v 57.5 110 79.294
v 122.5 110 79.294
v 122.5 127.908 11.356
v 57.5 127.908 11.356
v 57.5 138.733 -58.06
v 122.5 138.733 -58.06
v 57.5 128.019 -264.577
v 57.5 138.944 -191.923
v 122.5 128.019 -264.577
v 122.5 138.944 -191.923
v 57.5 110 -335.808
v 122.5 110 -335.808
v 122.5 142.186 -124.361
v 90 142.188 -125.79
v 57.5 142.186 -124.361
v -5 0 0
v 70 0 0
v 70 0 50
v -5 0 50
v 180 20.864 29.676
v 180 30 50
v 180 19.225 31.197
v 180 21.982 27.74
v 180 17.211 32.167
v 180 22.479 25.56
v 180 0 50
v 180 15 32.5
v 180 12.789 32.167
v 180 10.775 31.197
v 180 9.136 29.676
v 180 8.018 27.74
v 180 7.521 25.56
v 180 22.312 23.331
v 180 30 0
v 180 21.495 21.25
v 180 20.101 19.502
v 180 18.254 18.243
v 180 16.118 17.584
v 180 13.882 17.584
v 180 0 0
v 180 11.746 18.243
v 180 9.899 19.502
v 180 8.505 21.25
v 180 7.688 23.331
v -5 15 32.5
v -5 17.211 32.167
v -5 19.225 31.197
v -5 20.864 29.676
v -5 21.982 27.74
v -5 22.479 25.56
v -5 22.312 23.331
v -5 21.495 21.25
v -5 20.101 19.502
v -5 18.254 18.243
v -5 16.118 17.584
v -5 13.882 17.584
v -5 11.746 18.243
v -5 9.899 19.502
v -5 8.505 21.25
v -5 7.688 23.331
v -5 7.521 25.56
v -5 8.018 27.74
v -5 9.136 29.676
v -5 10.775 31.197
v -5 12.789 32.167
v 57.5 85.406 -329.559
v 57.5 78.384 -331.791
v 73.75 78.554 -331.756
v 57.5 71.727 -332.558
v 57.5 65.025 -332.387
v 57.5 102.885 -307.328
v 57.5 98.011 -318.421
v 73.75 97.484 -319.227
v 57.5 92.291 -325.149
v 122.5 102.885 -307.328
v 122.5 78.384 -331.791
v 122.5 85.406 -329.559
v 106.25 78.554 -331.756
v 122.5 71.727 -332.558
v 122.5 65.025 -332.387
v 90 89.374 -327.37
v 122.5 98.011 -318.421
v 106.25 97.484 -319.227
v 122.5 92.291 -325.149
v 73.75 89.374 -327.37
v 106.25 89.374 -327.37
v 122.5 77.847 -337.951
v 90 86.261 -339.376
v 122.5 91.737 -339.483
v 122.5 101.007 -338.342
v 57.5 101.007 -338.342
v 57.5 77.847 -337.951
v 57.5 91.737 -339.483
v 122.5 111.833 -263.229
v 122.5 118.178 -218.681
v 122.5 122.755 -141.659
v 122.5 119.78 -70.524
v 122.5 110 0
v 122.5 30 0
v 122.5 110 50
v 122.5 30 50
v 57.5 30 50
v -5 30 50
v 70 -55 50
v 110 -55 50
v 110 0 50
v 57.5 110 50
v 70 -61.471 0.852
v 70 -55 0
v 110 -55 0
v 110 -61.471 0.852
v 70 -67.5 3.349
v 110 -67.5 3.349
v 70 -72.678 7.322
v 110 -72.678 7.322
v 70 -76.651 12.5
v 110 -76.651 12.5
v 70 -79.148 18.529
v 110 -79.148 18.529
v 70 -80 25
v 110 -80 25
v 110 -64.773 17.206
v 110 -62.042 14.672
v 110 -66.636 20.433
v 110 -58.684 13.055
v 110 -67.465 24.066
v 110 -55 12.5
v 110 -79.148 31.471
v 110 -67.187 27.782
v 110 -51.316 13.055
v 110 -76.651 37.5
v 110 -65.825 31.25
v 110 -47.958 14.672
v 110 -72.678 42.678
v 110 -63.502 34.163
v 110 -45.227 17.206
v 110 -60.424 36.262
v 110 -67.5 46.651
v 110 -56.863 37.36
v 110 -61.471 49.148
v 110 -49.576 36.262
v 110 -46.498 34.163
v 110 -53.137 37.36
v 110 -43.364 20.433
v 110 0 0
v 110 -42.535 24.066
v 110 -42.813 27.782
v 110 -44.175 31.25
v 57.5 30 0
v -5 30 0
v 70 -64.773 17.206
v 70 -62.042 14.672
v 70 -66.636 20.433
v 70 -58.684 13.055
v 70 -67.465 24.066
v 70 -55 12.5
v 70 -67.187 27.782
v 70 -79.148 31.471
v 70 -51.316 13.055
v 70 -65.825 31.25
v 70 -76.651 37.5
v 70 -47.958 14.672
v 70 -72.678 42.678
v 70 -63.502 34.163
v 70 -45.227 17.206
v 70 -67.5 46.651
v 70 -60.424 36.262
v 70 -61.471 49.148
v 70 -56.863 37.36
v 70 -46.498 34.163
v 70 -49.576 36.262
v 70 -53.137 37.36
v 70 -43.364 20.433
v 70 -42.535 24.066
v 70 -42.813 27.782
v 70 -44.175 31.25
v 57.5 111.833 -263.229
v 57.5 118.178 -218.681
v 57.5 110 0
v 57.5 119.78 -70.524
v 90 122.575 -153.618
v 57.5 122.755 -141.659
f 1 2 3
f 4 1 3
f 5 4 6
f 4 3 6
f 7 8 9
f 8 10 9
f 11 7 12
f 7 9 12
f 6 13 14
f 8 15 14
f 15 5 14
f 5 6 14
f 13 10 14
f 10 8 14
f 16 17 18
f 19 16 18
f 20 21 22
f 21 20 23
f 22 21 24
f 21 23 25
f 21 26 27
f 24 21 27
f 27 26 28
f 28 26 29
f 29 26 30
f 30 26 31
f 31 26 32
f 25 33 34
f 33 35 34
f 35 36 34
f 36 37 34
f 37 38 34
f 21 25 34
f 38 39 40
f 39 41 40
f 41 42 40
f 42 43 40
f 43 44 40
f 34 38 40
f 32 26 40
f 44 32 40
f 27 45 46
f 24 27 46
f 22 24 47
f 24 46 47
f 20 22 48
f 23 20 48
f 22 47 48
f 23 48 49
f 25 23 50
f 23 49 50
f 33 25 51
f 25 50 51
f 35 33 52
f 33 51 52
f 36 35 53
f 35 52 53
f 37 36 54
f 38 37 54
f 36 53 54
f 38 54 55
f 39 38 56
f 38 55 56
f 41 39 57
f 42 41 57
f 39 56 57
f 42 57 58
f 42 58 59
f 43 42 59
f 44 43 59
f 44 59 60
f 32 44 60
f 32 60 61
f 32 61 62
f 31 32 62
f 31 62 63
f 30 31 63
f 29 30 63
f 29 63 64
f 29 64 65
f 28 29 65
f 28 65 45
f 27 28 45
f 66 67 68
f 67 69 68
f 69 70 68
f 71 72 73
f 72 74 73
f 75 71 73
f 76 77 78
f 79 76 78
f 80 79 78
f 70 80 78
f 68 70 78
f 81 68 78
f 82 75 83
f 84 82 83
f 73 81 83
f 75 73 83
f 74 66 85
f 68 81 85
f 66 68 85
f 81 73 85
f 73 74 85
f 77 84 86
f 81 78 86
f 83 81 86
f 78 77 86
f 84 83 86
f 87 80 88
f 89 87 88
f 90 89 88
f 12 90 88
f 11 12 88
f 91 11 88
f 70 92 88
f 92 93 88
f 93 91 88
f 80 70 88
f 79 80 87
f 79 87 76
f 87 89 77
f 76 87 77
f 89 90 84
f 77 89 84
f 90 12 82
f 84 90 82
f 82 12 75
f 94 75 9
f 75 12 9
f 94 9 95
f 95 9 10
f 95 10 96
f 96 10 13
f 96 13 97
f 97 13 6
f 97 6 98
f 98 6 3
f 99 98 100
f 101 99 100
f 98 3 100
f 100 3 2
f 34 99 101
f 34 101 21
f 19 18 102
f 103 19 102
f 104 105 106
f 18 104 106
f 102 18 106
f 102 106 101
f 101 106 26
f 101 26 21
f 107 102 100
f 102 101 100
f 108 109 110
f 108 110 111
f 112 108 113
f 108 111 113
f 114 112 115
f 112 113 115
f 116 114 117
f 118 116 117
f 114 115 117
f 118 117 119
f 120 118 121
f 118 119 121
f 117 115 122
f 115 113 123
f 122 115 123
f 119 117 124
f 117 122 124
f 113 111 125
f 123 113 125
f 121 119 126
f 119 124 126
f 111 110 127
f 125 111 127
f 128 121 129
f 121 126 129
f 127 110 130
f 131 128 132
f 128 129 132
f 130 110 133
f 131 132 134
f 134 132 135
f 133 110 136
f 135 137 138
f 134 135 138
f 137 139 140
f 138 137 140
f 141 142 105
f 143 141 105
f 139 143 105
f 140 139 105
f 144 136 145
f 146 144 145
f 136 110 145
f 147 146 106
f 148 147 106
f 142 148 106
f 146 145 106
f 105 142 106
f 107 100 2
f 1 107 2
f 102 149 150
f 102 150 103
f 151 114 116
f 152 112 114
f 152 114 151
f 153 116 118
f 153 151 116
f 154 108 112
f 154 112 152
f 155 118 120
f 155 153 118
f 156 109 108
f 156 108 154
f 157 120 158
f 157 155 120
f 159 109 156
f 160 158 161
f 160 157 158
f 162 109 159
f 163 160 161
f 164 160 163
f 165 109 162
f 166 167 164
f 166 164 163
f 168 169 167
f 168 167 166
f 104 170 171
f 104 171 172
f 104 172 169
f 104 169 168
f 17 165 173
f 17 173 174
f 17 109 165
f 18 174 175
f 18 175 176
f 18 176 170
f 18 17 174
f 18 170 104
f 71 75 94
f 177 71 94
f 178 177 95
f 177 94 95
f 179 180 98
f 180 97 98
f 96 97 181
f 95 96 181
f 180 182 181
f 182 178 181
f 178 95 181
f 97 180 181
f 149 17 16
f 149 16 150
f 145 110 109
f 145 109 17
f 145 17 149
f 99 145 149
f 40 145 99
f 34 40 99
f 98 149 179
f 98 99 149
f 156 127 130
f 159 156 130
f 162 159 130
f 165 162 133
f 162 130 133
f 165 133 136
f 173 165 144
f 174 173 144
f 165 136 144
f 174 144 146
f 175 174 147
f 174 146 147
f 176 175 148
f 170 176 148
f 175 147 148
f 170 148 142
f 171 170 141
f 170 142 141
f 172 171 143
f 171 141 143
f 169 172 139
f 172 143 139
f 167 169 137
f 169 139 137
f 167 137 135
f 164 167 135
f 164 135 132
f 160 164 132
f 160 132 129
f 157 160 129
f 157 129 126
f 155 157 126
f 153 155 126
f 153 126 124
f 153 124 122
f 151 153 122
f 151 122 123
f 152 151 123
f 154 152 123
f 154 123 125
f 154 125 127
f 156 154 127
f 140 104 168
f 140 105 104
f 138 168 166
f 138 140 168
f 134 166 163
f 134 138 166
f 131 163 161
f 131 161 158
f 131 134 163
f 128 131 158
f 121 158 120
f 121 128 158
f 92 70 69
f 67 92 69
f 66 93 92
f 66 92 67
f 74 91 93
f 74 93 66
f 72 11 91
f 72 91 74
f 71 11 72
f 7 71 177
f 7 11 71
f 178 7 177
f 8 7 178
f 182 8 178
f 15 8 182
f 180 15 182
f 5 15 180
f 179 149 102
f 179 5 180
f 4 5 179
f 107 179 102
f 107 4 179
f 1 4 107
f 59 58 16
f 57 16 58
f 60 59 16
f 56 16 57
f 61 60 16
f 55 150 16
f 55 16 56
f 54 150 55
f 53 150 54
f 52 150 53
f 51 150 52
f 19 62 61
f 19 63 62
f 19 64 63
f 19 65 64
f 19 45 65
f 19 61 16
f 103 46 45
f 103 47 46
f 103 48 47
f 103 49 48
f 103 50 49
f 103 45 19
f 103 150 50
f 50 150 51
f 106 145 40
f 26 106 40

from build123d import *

# Parameters (mm, degrees)
SKETCH_1_W          = 180
SKETCH_1_H          = 50
EXTRUDE_1_DEPTH     = 30
SKETCH_2_W          = 40
SKETCH_2_H          = 50
EXTRUDE_2_DEPTH     = 80
FILLET_1_R          = 25
SKETCH_3_R          = 12.5
CUT_EXTRUDE_2_DEPTH = 145.913767462
SKETCH_7_W          = 25
SKETCH_7_H          = 50
EXTRUDE_5_DEPTH     = 80
EXTRUDE_6_REACH     = 213.019
SKETCH_9_W          = 25.5
SKETCH_9_H          = 50
CUT_EXTRUDE_3_DEPTH = 401.320460854
SKETCH_10_W         = 65
SKETCH_10_H         = 50
EXTRUDE_7_DEPTH     = 80
SKETCH_11_W         = 50
SKETCH_11_H         = 30
EXTRUDE_8_DEPTH     = 10
SKETCH_12_W         = 50
SKETCH_12_H         = 30
CUT_EXTRUDE_4_DEPTH = 5
SKETCH_13_R         = 7.5
CUT_EXTRUDE_5_DEPTH = 412.96204223


with BuildPart() as part:
    # 草图1 → 凸台-拉伸1 (new body)
    with BuildSketch(Plane(origin=(0, 0, 0), x_dir=(1, 0, 0), z_dir=(0, 1, 0))):
        with Locations((90, -25)):
            Rectangle(SKETCH_1_W, SKETCH_1_H)
    extrude(amount=EXTRUDE_1_DEPTH)

    # 草图2 → 凸台-拉伸2 (add)
    with BuildSketch(Plane.XZ):
        with Locations((90, 25)):
            Rectangle(SKETCH_2_W, SKETCH_2_H)
    extrude(amount=EXTRUDE_2_DEPTH)

    # 圆角1
    fillet_1_edges = [part.edges().sort_by_distance(p)[0] for p in [
        (90, -80, 50),
        (90, -80, 0),
    ]]
    fillet(fillet_1_edges, radius=FILLET_1_R - 0.0001)  # a hair under: the kernel refuses the full size

    # 草图3 → 切除-拉伸2 (cut, through all)
    with BuildSketch(Plane(origin=(110, 0, 0), x_dir=(0, 0, -1), z_dir=(1, 0, 0))):
        with Locations((-25, -55)):
            Circle(SKETCH_3_R)
    extrude(amount=-CUT_EXTRUDE_2_DEPTH, mode=Mode.SUBTRACT)

    # 草图7 → 凸台-拉伸5 (add)
    with BuildSketch(Plane(origin=(0, 30, 0), x_dir=(1, 0, 0), z_dir=(0, 1, 0))):
        with Locations((19.5, -25)):
            Rectangle(SKETCH_7_W, SKETCH_7_H)
        with Locations((160.5, -25)):
            Rectangle(SKETCH_7_W, SKETCH_7_H)
    extrude(amount=EXTRUDE_5_DEPTH)

    # 凸台-拉伸6: up to this face of the body (flat: up to its plane)
    extrude_6_end = Plane(part.part.faces().sort_by_distance((7, 70, 25))[0])
    # 草图8 → 凸台-拉伸6 (add, up to the picked face)
    with BuildSketch(Plane(origin=(173, 0, 0), x_dir=(0, 0, -1), z_dir=(1, 0, 0)), mode=Mode.PRIVATE) as extrude_6_sk1:
        with BuildLine():
            Line((0, 110), (-79.29372145, 110))
            add(Edge.make_bspline(
                [(-79.29372145, 110), (123.322725029, 174.375095478), (335.808448859, 110)],
                knots=[0, 0, 0, 1, 1, 1], degree=2))
            add(Edge.make_bspline(
                [(335.808448859, 110), (344.655163531, 85.008885119), (332.386652106, 65.024574676)],
                knots=[0, 0, 0, 1, 1, 1], degree=2))
            add(Edge.make_bspline(
                [(332.386652106, 65.024574676), (334.882025134, 94.793074398), (307.328252939, 102.88474179)],
                knots=[0, 0, 0, 1, 1, 1], degree=2))
            add(Edge.make_bspline(
                [(307.328252939, 102.88474179), (153.571097441, 138.708355764), (0, 110)],
                knots=[0, 0, 0, 1, 1, 1], degree=2))
        make_face()
    extrude_6_tool1 = split(extrude(extrude_6_sk1.sketch, amount=-EXTRUDE_6_REACH, mode=Mode.PRIVATE), bisect_by=extrude_6_end, keep=Keep.BOTH, mode=Mode.PRIVATE)
    add(extrude_6_tool1.solids().sort_by(Axis((173, 122.914419, -143.709252), (-1, 0, 0)))[0])

    # 草图9 → 切除-拉伸3 (cut, through all)
    with BuildSketch(Plane(origin=(0, 30, 0), x_dir=(1, 0, 0), z_dir=(0, 1, 0))):
        Polygon((57.5, -50), (32, -50), (32, 0), (57.5, 0), (57.5, 350.332715619), (7, 350.332715619), (7, -79.29372145), (57.5, -79.29372145), align=None)
        Polygon((148, -50), (122.5, -50), (122.5, -79.29372145), (173, -79.29372145), (173, 350.332715619), (122.5, 350.332715619), (122.5, 0), (148, 0), align=None)
        with Locations((44.75, -25)):
            Rectangle(SKETCH_9_W, SKETCH_9_H)
        with Locations((135.25, -25)):
            Rectangle(SKETCH_9_W, SKETCH_9_H)
    extrude(amount=CUT_EXTRUDE_3_DEPTH, mode=Mode.SUBTRACT)


with BuildPart() as cut_extrude_3_piece_1:
    # of the separate pieces the step leaves, piece 1, a body of its own (cut_extrude_3_pieces)
    add(part.part.solids().sort_by_distance((122.5, 110, 0))[0])



with BuildPart() as cut_extrude_3_piece_2:
    # of the separate pieces the step leaves, piece 2, a body of its own (cut_extrude_3_pieces)
    add(part.part.solids().sort_by_distance((110, -55.0001, 0))[0])


with BuildPart() as cut_extrude_3_piece_1_1:
    add(cut_extrude_3_piece_1.part)

    add(cut_extrude_3_piece_2.part)  # 凸台-拉伸7 merges 切除-拉伸3 piece 2
    # 草图10 → 凸台-拉伸7 (add)
    with BuildSketch(Plane.XZ.offset(-110)):
        with Locations((90, 25)):
            Rectangle(SKETCH_10_W, SKETCH_10_H)
    extrude(amount=EXTRUDE_7_DEPTH)

    # 草图11 → 凸台-拉伸8 (add)
    with BuildSketch(Plane.ZY):
        with Locations((25, 15)):
            Rectangle(SKETCH_11_W, SKETCH_11_H)
    extrude(amount=EXTRUDE_8_DEPTH)

    # 草图12 → 切除-拉伸4 (cut)
    with BuildSketch(Plane.ZY.offset(10)):
        with Locations((25, 15)):
            Rectangle(SKETCH_12_W, SKETCH_12_H)
    extrude(amount=-CUT_EXTRUDE_4_DEPTH, mode=Mode.SUBTRACT)

    # 草图13 → 切除-拉伸5 (cut, through all)
    with BuildSketch(Plane.ZY.offset(5)):
        with Locations((25, 15)):
            Circle(SKETCH_13_R)
    extrude(amount=-CUT_EXTRUDE_5_DEPTH, mode=Mode.SUBTRACT)


solid = cut_extrude_3_piece_1_1.part
